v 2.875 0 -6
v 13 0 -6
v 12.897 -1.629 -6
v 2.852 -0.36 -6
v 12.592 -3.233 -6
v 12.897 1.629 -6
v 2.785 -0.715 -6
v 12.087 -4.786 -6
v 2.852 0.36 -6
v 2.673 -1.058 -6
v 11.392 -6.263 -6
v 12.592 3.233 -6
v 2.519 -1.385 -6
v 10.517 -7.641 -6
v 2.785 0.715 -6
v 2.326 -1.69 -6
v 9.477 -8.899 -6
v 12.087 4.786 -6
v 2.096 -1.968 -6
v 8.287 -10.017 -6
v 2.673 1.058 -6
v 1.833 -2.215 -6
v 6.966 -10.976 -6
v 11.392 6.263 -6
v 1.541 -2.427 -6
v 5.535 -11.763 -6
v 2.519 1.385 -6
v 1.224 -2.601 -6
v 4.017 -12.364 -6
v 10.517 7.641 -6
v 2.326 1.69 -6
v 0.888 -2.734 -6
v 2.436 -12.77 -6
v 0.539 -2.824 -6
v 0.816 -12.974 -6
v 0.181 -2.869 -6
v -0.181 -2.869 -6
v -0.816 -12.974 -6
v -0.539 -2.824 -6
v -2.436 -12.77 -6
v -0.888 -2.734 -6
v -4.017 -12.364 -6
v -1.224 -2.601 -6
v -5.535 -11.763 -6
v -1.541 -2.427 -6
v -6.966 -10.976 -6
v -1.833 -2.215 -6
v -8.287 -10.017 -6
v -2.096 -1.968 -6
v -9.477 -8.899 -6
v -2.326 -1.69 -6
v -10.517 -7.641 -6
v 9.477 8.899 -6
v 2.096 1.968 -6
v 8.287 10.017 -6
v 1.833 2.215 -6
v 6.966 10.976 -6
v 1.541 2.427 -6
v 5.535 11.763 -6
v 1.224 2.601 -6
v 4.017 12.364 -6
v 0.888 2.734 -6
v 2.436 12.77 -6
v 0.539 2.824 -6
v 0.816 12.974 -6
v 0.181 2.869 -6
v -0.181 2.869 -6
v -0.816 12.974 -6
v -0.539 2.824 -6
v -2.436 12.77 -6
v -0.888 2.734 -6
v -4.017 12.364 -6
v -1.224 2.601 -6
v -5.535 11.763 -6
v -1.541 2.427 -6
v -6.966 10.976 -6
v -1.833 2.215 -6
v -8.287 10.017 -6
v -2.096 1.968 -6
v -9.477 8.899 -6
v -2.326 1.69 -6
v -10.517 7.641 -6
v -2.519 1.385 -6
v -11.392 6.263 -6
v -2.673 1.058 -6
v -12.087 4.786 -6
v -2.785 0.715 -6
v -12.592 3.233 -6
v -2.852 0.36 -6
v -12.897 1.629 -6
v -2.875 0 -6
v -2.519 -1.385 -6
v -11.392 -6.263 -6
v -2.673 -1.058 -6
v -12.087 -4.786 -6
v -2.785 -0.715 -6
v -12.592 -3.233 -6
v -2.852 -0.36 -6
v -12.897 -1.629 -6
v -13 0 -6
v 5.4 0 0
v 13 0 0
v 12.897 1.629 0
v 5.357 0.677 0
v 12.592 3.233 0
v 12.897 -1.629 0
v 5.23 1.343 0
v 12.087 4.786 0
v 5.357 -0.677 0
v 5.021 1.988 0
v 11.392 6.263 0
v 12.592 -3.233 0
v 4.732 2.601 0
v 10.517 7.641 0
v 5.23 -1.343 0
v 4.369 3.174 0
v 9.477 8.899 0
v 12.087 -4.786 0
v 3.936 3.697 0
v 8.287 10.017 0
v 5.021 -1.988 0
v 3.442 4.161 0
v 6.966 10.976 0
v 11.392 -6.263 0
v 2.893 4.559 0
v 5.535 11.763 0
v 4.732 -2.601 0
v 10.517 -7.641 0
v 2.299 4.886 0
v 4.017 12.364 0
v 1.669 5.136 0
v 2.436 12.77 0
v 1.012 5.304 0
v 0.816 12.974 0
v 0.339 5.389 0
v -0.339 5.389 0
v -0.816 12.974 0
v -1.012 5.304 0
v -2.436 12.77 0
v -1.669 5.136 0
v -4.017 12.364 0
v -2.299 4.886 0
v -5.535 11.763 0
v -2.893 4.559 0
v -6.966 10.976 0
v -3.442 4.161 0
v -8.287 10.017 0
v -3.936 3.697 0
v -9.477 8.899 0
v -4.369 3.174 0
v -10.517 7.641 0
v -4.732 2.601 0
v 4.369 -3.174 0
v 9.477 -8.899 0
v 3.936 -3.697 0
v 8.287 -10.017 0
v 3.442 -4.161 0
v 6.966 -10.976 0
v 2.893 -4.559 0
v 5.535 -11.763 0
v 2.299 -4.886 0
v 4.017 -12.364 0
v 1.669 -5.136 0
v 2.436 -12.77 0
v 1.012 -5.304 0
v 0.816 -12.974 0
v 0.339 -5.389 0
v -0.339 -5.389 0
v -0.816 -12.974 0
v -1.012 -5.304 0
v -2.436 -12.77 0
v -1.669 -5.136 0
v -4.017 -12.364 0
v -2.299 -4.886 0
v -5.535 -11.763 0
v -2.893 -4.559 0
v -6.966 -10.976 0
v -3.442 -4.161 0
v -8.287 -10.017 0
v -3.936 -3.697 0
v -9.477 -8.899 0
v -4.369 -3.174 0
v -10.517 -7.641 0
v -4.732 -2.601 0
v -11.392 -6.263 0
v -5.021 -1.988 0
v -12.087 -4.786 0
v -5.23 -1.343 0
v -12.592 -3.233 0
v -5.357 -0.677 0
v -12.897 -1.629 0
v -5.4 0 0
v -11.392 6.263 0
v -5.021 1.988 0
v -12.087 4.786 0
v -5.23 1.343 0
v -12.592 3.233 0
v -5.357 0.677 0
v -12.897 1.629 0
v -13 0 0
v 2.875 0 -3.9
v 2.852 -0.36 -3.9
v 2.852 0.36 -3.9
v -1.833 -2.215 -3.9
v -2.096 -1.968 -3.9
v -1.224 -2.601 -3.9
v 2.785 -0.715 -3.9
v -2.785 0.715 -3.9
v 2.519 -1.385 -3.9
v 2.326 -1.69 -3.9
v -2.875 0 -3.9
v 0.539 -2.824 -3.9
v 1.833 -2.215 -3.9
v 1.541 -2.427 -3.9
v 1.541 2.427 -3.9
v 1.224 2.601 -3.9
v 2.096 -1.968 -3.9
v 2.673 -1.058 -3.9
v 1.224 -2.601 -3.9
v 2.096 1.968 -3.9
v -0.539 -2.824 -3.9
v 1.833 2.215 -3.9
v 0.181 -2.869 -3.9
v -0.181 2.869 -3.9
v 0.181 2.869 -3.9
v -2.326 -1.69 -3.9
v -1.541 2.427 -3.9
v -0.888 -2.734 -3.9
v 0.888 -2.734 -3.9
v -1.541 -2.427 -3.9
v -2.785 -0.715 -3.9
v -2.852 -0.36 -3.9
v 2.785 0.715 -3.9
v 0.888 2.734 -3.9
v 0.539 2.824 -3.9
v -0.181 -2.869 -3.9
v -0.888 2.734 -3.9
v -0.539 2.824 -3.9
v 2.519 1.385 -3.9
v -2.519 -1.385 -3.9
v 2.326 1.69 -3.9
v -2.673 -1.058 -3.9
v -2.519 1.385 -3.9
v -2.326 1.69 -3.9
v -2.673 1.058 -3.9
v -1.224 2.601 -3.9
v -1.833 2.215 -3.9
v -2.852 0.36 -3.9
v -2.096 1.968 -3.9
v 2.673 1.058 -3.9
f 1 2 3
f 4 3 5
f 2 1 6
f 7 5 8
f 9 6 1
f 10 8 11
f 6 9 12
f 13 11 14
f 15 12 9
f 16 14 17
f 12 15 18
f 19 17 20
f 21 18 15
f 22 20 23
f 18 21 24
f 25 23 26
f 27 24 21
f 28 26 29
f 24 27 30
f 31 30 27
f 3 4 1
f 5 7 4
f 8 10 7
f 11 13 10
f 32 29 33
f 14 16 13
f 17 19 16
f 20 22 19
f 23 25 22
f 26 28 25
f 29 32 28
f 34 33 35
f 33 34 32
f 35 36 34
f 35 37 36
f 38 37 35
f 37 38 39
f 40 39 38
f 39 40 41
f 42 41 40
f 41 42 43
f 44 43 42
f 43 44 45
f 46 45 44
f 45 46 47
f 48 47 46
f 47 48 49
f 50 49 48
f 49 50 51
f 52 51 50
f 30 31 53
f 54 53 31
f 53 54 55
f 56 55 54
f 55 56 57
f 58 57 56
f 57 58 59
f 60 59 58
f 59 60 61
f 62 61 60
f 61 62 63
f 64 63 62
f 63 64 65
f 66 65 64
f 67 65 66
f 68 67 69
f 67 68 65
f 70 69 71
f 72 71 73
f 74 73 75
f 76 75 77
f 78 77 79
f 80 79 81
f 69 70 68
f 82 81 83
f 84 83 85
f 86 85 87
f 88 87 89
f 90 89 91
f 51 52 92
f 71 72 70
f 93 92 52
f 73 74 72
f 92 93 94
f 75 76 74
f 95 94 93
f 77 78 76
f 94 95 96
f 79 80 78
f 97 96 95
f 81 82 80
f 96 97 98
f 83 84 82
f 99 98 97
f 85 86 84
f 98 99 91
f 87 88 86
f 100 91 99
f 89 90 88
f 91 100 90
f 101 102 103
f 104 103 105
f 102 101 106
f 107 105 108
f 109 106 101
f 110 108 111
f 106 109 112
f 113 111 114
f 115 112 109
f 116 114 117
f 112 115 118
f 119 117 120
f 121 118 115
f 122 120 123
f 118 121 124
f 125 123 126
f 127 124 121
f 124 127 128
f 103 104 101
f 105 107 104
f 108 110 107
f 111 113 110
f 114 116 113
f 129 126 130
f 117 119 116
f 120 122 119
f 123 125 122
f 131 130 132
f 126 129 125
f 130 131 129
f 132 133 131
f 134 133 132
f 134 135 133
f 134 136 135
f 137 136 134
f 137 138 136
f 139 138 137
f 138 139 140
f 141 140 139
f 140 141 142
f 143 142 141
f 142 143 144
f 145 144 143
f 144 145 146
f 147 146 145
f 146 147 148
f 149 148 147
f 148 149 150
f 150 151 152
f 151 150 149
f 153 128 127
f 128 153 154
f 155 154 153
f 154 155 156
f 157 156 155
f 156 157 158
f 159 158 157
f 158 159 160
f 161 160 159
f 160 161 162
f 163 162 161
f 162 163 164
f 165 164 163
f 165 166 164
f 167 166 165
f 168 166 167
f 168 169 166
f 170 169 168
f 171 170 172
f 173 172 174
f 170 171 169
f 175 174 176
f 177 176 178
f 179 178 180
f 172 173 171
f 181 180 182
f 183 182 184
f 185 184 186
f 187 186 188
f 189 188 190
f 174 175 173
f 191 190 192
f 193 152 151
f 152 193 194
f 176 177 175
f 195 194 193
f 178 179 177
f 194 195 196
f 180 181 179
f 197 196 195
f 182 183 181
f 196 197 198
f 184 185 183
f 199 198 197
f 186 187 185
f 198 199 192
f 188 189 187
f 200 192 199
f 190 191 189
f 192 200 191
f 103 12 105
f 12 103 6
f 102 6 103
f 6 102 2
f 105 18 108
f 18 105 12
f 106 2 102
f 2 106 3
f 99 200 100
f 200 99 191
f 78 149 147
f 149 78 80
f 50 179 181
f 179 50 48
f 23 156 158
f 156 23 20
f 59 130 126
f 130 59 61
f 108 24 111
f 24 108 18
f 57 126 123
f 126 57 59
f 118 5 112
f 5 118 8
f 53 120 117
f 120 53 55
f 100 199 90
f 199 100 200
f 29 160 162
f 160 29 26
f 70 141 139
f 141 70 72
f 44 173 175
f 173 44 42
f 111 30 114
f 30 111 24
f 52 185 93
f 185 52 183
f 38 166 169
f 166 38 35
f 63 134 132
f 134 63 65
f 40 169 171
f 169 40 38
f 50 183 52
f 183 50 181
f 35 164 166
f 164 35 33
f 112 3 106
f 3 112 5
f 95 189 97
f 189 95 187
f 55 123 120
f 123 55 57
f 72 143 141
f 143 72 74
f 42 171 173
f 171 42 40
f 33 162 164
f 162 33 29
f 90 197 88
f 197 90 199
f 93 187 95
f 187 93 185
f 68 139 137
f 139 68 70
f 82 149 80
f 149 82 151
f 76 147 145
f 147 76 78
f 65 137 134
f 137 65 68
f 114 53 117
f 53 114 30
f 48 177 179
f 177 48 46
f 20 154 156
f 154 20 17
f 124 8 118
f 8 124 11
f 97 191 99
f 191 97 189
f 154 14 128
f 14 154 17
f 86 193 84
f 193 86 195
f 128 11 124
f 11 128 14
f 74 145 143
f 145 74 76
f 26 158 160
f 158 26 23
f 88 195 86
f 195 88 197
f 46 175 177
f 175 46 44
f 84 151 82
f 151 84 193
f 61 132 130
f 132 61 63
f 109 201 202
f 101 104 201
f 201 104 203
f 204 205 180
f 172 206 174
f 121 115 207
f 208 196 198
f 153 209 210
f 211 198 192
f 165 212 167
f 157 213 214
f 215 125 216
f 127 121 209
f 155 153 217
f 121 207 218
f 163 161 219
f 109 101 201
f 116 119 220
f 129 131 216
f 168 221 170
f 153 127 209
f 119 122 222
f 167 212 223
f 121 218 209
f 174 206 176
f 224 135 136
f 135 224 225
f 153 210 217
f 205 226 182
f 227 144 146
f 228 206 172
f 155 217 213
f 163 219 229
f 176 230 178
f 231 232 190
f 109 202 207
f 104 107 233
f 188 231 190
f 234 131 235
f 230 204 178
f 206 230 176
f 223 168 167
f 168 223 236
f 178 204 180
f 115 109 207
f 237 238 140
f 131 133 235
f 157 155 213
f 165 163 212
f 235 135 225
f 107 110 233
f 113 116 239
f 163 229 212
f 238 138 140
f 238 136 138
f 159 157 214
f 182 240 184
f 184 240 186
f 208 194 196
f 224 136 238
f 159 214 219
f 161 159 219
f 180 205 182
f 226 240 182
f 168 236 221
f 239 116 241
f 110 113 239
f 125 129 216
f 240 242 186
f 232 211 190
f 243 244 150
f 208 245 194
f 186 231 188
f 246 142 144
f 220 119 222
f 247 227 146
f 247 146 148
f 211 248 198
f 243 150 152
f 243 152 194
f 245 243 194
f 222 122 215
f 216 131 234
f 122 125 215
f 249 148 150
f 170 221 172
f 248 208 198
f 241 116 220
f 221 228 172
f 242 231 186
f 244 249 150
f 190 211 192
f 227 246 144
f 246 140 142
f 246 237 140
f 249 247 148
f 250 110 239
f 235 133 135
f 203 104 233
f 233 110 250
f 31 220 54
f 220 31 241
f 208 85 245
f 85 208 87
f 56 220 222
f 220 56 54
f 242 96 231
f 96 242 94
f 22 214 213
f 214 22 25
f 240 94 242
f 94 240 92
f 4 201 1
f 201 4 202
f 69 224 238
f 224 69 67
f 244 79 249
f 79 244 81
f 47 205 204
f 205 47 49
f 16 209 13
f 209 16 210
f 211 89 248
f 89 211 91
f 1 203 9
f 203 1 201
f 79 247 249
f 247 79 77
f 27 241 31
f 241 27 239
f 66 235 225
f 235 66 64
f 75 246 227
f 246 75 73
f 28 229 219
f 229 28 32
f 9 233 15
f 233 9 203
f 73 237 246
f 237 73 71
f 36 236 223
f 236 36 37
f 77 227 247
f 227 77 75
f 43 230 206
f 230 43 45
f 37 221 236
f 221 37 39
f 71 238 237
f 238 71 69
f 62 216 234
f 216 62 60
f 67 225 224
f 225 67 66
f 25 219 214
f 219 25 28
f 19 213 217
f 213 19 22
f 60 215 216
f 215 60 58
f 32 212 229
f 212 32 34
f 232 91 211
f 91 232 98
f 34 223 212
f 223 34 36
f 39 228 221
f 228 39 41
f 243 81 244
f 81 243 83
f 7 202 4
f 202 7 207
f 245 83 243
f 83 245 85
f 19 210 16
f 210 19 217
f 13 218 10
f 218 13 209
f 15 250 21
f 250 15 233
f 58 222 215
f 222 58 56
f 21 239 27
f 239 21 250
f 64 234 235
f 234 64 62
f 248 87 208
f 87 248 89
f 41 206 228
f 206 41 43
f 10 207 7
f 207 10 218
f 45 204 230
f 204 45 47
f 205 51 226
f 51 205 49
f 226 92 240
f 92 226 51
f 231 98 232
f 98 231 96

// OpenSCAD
$fn = 50;


difference() {
	union() {
		translate(v = [0, 0, -6.0000000000]) {
			cylinder(h = 6, r = 10.0000000000);
		}
		translate(v = [0, 0, -6.0000000000]) {
			cylinder(h = 6, r = 13.0000000000);
		}
	}
	union() {
		translate(v = [0, 0, 0]) {
			rotate(a = [0, 0, 0]) {
				difference() {
					union() {
						#translate(v = [0, 0, -6.0000000000]) {
							cylinder(h = 6, r = 2.6000000000);
						}
						#translate(v = [0, 0, -3.9000000000]) {
							cylinder(h = 3.9000000000, r1 = 2.8750000000, r2 = 5.4000000000);
						}
						#translate(v = [0, 0, -6.0000000000]) {
							cylinder(h = 6, r = 2.8750000000);
						}
						#translate(v = [0, 0, -6.0000000000]) {
							cylinder(h = 6, r = 2.6000000000);
						}
					}
					union();
				}
			}
		}
	}
}
